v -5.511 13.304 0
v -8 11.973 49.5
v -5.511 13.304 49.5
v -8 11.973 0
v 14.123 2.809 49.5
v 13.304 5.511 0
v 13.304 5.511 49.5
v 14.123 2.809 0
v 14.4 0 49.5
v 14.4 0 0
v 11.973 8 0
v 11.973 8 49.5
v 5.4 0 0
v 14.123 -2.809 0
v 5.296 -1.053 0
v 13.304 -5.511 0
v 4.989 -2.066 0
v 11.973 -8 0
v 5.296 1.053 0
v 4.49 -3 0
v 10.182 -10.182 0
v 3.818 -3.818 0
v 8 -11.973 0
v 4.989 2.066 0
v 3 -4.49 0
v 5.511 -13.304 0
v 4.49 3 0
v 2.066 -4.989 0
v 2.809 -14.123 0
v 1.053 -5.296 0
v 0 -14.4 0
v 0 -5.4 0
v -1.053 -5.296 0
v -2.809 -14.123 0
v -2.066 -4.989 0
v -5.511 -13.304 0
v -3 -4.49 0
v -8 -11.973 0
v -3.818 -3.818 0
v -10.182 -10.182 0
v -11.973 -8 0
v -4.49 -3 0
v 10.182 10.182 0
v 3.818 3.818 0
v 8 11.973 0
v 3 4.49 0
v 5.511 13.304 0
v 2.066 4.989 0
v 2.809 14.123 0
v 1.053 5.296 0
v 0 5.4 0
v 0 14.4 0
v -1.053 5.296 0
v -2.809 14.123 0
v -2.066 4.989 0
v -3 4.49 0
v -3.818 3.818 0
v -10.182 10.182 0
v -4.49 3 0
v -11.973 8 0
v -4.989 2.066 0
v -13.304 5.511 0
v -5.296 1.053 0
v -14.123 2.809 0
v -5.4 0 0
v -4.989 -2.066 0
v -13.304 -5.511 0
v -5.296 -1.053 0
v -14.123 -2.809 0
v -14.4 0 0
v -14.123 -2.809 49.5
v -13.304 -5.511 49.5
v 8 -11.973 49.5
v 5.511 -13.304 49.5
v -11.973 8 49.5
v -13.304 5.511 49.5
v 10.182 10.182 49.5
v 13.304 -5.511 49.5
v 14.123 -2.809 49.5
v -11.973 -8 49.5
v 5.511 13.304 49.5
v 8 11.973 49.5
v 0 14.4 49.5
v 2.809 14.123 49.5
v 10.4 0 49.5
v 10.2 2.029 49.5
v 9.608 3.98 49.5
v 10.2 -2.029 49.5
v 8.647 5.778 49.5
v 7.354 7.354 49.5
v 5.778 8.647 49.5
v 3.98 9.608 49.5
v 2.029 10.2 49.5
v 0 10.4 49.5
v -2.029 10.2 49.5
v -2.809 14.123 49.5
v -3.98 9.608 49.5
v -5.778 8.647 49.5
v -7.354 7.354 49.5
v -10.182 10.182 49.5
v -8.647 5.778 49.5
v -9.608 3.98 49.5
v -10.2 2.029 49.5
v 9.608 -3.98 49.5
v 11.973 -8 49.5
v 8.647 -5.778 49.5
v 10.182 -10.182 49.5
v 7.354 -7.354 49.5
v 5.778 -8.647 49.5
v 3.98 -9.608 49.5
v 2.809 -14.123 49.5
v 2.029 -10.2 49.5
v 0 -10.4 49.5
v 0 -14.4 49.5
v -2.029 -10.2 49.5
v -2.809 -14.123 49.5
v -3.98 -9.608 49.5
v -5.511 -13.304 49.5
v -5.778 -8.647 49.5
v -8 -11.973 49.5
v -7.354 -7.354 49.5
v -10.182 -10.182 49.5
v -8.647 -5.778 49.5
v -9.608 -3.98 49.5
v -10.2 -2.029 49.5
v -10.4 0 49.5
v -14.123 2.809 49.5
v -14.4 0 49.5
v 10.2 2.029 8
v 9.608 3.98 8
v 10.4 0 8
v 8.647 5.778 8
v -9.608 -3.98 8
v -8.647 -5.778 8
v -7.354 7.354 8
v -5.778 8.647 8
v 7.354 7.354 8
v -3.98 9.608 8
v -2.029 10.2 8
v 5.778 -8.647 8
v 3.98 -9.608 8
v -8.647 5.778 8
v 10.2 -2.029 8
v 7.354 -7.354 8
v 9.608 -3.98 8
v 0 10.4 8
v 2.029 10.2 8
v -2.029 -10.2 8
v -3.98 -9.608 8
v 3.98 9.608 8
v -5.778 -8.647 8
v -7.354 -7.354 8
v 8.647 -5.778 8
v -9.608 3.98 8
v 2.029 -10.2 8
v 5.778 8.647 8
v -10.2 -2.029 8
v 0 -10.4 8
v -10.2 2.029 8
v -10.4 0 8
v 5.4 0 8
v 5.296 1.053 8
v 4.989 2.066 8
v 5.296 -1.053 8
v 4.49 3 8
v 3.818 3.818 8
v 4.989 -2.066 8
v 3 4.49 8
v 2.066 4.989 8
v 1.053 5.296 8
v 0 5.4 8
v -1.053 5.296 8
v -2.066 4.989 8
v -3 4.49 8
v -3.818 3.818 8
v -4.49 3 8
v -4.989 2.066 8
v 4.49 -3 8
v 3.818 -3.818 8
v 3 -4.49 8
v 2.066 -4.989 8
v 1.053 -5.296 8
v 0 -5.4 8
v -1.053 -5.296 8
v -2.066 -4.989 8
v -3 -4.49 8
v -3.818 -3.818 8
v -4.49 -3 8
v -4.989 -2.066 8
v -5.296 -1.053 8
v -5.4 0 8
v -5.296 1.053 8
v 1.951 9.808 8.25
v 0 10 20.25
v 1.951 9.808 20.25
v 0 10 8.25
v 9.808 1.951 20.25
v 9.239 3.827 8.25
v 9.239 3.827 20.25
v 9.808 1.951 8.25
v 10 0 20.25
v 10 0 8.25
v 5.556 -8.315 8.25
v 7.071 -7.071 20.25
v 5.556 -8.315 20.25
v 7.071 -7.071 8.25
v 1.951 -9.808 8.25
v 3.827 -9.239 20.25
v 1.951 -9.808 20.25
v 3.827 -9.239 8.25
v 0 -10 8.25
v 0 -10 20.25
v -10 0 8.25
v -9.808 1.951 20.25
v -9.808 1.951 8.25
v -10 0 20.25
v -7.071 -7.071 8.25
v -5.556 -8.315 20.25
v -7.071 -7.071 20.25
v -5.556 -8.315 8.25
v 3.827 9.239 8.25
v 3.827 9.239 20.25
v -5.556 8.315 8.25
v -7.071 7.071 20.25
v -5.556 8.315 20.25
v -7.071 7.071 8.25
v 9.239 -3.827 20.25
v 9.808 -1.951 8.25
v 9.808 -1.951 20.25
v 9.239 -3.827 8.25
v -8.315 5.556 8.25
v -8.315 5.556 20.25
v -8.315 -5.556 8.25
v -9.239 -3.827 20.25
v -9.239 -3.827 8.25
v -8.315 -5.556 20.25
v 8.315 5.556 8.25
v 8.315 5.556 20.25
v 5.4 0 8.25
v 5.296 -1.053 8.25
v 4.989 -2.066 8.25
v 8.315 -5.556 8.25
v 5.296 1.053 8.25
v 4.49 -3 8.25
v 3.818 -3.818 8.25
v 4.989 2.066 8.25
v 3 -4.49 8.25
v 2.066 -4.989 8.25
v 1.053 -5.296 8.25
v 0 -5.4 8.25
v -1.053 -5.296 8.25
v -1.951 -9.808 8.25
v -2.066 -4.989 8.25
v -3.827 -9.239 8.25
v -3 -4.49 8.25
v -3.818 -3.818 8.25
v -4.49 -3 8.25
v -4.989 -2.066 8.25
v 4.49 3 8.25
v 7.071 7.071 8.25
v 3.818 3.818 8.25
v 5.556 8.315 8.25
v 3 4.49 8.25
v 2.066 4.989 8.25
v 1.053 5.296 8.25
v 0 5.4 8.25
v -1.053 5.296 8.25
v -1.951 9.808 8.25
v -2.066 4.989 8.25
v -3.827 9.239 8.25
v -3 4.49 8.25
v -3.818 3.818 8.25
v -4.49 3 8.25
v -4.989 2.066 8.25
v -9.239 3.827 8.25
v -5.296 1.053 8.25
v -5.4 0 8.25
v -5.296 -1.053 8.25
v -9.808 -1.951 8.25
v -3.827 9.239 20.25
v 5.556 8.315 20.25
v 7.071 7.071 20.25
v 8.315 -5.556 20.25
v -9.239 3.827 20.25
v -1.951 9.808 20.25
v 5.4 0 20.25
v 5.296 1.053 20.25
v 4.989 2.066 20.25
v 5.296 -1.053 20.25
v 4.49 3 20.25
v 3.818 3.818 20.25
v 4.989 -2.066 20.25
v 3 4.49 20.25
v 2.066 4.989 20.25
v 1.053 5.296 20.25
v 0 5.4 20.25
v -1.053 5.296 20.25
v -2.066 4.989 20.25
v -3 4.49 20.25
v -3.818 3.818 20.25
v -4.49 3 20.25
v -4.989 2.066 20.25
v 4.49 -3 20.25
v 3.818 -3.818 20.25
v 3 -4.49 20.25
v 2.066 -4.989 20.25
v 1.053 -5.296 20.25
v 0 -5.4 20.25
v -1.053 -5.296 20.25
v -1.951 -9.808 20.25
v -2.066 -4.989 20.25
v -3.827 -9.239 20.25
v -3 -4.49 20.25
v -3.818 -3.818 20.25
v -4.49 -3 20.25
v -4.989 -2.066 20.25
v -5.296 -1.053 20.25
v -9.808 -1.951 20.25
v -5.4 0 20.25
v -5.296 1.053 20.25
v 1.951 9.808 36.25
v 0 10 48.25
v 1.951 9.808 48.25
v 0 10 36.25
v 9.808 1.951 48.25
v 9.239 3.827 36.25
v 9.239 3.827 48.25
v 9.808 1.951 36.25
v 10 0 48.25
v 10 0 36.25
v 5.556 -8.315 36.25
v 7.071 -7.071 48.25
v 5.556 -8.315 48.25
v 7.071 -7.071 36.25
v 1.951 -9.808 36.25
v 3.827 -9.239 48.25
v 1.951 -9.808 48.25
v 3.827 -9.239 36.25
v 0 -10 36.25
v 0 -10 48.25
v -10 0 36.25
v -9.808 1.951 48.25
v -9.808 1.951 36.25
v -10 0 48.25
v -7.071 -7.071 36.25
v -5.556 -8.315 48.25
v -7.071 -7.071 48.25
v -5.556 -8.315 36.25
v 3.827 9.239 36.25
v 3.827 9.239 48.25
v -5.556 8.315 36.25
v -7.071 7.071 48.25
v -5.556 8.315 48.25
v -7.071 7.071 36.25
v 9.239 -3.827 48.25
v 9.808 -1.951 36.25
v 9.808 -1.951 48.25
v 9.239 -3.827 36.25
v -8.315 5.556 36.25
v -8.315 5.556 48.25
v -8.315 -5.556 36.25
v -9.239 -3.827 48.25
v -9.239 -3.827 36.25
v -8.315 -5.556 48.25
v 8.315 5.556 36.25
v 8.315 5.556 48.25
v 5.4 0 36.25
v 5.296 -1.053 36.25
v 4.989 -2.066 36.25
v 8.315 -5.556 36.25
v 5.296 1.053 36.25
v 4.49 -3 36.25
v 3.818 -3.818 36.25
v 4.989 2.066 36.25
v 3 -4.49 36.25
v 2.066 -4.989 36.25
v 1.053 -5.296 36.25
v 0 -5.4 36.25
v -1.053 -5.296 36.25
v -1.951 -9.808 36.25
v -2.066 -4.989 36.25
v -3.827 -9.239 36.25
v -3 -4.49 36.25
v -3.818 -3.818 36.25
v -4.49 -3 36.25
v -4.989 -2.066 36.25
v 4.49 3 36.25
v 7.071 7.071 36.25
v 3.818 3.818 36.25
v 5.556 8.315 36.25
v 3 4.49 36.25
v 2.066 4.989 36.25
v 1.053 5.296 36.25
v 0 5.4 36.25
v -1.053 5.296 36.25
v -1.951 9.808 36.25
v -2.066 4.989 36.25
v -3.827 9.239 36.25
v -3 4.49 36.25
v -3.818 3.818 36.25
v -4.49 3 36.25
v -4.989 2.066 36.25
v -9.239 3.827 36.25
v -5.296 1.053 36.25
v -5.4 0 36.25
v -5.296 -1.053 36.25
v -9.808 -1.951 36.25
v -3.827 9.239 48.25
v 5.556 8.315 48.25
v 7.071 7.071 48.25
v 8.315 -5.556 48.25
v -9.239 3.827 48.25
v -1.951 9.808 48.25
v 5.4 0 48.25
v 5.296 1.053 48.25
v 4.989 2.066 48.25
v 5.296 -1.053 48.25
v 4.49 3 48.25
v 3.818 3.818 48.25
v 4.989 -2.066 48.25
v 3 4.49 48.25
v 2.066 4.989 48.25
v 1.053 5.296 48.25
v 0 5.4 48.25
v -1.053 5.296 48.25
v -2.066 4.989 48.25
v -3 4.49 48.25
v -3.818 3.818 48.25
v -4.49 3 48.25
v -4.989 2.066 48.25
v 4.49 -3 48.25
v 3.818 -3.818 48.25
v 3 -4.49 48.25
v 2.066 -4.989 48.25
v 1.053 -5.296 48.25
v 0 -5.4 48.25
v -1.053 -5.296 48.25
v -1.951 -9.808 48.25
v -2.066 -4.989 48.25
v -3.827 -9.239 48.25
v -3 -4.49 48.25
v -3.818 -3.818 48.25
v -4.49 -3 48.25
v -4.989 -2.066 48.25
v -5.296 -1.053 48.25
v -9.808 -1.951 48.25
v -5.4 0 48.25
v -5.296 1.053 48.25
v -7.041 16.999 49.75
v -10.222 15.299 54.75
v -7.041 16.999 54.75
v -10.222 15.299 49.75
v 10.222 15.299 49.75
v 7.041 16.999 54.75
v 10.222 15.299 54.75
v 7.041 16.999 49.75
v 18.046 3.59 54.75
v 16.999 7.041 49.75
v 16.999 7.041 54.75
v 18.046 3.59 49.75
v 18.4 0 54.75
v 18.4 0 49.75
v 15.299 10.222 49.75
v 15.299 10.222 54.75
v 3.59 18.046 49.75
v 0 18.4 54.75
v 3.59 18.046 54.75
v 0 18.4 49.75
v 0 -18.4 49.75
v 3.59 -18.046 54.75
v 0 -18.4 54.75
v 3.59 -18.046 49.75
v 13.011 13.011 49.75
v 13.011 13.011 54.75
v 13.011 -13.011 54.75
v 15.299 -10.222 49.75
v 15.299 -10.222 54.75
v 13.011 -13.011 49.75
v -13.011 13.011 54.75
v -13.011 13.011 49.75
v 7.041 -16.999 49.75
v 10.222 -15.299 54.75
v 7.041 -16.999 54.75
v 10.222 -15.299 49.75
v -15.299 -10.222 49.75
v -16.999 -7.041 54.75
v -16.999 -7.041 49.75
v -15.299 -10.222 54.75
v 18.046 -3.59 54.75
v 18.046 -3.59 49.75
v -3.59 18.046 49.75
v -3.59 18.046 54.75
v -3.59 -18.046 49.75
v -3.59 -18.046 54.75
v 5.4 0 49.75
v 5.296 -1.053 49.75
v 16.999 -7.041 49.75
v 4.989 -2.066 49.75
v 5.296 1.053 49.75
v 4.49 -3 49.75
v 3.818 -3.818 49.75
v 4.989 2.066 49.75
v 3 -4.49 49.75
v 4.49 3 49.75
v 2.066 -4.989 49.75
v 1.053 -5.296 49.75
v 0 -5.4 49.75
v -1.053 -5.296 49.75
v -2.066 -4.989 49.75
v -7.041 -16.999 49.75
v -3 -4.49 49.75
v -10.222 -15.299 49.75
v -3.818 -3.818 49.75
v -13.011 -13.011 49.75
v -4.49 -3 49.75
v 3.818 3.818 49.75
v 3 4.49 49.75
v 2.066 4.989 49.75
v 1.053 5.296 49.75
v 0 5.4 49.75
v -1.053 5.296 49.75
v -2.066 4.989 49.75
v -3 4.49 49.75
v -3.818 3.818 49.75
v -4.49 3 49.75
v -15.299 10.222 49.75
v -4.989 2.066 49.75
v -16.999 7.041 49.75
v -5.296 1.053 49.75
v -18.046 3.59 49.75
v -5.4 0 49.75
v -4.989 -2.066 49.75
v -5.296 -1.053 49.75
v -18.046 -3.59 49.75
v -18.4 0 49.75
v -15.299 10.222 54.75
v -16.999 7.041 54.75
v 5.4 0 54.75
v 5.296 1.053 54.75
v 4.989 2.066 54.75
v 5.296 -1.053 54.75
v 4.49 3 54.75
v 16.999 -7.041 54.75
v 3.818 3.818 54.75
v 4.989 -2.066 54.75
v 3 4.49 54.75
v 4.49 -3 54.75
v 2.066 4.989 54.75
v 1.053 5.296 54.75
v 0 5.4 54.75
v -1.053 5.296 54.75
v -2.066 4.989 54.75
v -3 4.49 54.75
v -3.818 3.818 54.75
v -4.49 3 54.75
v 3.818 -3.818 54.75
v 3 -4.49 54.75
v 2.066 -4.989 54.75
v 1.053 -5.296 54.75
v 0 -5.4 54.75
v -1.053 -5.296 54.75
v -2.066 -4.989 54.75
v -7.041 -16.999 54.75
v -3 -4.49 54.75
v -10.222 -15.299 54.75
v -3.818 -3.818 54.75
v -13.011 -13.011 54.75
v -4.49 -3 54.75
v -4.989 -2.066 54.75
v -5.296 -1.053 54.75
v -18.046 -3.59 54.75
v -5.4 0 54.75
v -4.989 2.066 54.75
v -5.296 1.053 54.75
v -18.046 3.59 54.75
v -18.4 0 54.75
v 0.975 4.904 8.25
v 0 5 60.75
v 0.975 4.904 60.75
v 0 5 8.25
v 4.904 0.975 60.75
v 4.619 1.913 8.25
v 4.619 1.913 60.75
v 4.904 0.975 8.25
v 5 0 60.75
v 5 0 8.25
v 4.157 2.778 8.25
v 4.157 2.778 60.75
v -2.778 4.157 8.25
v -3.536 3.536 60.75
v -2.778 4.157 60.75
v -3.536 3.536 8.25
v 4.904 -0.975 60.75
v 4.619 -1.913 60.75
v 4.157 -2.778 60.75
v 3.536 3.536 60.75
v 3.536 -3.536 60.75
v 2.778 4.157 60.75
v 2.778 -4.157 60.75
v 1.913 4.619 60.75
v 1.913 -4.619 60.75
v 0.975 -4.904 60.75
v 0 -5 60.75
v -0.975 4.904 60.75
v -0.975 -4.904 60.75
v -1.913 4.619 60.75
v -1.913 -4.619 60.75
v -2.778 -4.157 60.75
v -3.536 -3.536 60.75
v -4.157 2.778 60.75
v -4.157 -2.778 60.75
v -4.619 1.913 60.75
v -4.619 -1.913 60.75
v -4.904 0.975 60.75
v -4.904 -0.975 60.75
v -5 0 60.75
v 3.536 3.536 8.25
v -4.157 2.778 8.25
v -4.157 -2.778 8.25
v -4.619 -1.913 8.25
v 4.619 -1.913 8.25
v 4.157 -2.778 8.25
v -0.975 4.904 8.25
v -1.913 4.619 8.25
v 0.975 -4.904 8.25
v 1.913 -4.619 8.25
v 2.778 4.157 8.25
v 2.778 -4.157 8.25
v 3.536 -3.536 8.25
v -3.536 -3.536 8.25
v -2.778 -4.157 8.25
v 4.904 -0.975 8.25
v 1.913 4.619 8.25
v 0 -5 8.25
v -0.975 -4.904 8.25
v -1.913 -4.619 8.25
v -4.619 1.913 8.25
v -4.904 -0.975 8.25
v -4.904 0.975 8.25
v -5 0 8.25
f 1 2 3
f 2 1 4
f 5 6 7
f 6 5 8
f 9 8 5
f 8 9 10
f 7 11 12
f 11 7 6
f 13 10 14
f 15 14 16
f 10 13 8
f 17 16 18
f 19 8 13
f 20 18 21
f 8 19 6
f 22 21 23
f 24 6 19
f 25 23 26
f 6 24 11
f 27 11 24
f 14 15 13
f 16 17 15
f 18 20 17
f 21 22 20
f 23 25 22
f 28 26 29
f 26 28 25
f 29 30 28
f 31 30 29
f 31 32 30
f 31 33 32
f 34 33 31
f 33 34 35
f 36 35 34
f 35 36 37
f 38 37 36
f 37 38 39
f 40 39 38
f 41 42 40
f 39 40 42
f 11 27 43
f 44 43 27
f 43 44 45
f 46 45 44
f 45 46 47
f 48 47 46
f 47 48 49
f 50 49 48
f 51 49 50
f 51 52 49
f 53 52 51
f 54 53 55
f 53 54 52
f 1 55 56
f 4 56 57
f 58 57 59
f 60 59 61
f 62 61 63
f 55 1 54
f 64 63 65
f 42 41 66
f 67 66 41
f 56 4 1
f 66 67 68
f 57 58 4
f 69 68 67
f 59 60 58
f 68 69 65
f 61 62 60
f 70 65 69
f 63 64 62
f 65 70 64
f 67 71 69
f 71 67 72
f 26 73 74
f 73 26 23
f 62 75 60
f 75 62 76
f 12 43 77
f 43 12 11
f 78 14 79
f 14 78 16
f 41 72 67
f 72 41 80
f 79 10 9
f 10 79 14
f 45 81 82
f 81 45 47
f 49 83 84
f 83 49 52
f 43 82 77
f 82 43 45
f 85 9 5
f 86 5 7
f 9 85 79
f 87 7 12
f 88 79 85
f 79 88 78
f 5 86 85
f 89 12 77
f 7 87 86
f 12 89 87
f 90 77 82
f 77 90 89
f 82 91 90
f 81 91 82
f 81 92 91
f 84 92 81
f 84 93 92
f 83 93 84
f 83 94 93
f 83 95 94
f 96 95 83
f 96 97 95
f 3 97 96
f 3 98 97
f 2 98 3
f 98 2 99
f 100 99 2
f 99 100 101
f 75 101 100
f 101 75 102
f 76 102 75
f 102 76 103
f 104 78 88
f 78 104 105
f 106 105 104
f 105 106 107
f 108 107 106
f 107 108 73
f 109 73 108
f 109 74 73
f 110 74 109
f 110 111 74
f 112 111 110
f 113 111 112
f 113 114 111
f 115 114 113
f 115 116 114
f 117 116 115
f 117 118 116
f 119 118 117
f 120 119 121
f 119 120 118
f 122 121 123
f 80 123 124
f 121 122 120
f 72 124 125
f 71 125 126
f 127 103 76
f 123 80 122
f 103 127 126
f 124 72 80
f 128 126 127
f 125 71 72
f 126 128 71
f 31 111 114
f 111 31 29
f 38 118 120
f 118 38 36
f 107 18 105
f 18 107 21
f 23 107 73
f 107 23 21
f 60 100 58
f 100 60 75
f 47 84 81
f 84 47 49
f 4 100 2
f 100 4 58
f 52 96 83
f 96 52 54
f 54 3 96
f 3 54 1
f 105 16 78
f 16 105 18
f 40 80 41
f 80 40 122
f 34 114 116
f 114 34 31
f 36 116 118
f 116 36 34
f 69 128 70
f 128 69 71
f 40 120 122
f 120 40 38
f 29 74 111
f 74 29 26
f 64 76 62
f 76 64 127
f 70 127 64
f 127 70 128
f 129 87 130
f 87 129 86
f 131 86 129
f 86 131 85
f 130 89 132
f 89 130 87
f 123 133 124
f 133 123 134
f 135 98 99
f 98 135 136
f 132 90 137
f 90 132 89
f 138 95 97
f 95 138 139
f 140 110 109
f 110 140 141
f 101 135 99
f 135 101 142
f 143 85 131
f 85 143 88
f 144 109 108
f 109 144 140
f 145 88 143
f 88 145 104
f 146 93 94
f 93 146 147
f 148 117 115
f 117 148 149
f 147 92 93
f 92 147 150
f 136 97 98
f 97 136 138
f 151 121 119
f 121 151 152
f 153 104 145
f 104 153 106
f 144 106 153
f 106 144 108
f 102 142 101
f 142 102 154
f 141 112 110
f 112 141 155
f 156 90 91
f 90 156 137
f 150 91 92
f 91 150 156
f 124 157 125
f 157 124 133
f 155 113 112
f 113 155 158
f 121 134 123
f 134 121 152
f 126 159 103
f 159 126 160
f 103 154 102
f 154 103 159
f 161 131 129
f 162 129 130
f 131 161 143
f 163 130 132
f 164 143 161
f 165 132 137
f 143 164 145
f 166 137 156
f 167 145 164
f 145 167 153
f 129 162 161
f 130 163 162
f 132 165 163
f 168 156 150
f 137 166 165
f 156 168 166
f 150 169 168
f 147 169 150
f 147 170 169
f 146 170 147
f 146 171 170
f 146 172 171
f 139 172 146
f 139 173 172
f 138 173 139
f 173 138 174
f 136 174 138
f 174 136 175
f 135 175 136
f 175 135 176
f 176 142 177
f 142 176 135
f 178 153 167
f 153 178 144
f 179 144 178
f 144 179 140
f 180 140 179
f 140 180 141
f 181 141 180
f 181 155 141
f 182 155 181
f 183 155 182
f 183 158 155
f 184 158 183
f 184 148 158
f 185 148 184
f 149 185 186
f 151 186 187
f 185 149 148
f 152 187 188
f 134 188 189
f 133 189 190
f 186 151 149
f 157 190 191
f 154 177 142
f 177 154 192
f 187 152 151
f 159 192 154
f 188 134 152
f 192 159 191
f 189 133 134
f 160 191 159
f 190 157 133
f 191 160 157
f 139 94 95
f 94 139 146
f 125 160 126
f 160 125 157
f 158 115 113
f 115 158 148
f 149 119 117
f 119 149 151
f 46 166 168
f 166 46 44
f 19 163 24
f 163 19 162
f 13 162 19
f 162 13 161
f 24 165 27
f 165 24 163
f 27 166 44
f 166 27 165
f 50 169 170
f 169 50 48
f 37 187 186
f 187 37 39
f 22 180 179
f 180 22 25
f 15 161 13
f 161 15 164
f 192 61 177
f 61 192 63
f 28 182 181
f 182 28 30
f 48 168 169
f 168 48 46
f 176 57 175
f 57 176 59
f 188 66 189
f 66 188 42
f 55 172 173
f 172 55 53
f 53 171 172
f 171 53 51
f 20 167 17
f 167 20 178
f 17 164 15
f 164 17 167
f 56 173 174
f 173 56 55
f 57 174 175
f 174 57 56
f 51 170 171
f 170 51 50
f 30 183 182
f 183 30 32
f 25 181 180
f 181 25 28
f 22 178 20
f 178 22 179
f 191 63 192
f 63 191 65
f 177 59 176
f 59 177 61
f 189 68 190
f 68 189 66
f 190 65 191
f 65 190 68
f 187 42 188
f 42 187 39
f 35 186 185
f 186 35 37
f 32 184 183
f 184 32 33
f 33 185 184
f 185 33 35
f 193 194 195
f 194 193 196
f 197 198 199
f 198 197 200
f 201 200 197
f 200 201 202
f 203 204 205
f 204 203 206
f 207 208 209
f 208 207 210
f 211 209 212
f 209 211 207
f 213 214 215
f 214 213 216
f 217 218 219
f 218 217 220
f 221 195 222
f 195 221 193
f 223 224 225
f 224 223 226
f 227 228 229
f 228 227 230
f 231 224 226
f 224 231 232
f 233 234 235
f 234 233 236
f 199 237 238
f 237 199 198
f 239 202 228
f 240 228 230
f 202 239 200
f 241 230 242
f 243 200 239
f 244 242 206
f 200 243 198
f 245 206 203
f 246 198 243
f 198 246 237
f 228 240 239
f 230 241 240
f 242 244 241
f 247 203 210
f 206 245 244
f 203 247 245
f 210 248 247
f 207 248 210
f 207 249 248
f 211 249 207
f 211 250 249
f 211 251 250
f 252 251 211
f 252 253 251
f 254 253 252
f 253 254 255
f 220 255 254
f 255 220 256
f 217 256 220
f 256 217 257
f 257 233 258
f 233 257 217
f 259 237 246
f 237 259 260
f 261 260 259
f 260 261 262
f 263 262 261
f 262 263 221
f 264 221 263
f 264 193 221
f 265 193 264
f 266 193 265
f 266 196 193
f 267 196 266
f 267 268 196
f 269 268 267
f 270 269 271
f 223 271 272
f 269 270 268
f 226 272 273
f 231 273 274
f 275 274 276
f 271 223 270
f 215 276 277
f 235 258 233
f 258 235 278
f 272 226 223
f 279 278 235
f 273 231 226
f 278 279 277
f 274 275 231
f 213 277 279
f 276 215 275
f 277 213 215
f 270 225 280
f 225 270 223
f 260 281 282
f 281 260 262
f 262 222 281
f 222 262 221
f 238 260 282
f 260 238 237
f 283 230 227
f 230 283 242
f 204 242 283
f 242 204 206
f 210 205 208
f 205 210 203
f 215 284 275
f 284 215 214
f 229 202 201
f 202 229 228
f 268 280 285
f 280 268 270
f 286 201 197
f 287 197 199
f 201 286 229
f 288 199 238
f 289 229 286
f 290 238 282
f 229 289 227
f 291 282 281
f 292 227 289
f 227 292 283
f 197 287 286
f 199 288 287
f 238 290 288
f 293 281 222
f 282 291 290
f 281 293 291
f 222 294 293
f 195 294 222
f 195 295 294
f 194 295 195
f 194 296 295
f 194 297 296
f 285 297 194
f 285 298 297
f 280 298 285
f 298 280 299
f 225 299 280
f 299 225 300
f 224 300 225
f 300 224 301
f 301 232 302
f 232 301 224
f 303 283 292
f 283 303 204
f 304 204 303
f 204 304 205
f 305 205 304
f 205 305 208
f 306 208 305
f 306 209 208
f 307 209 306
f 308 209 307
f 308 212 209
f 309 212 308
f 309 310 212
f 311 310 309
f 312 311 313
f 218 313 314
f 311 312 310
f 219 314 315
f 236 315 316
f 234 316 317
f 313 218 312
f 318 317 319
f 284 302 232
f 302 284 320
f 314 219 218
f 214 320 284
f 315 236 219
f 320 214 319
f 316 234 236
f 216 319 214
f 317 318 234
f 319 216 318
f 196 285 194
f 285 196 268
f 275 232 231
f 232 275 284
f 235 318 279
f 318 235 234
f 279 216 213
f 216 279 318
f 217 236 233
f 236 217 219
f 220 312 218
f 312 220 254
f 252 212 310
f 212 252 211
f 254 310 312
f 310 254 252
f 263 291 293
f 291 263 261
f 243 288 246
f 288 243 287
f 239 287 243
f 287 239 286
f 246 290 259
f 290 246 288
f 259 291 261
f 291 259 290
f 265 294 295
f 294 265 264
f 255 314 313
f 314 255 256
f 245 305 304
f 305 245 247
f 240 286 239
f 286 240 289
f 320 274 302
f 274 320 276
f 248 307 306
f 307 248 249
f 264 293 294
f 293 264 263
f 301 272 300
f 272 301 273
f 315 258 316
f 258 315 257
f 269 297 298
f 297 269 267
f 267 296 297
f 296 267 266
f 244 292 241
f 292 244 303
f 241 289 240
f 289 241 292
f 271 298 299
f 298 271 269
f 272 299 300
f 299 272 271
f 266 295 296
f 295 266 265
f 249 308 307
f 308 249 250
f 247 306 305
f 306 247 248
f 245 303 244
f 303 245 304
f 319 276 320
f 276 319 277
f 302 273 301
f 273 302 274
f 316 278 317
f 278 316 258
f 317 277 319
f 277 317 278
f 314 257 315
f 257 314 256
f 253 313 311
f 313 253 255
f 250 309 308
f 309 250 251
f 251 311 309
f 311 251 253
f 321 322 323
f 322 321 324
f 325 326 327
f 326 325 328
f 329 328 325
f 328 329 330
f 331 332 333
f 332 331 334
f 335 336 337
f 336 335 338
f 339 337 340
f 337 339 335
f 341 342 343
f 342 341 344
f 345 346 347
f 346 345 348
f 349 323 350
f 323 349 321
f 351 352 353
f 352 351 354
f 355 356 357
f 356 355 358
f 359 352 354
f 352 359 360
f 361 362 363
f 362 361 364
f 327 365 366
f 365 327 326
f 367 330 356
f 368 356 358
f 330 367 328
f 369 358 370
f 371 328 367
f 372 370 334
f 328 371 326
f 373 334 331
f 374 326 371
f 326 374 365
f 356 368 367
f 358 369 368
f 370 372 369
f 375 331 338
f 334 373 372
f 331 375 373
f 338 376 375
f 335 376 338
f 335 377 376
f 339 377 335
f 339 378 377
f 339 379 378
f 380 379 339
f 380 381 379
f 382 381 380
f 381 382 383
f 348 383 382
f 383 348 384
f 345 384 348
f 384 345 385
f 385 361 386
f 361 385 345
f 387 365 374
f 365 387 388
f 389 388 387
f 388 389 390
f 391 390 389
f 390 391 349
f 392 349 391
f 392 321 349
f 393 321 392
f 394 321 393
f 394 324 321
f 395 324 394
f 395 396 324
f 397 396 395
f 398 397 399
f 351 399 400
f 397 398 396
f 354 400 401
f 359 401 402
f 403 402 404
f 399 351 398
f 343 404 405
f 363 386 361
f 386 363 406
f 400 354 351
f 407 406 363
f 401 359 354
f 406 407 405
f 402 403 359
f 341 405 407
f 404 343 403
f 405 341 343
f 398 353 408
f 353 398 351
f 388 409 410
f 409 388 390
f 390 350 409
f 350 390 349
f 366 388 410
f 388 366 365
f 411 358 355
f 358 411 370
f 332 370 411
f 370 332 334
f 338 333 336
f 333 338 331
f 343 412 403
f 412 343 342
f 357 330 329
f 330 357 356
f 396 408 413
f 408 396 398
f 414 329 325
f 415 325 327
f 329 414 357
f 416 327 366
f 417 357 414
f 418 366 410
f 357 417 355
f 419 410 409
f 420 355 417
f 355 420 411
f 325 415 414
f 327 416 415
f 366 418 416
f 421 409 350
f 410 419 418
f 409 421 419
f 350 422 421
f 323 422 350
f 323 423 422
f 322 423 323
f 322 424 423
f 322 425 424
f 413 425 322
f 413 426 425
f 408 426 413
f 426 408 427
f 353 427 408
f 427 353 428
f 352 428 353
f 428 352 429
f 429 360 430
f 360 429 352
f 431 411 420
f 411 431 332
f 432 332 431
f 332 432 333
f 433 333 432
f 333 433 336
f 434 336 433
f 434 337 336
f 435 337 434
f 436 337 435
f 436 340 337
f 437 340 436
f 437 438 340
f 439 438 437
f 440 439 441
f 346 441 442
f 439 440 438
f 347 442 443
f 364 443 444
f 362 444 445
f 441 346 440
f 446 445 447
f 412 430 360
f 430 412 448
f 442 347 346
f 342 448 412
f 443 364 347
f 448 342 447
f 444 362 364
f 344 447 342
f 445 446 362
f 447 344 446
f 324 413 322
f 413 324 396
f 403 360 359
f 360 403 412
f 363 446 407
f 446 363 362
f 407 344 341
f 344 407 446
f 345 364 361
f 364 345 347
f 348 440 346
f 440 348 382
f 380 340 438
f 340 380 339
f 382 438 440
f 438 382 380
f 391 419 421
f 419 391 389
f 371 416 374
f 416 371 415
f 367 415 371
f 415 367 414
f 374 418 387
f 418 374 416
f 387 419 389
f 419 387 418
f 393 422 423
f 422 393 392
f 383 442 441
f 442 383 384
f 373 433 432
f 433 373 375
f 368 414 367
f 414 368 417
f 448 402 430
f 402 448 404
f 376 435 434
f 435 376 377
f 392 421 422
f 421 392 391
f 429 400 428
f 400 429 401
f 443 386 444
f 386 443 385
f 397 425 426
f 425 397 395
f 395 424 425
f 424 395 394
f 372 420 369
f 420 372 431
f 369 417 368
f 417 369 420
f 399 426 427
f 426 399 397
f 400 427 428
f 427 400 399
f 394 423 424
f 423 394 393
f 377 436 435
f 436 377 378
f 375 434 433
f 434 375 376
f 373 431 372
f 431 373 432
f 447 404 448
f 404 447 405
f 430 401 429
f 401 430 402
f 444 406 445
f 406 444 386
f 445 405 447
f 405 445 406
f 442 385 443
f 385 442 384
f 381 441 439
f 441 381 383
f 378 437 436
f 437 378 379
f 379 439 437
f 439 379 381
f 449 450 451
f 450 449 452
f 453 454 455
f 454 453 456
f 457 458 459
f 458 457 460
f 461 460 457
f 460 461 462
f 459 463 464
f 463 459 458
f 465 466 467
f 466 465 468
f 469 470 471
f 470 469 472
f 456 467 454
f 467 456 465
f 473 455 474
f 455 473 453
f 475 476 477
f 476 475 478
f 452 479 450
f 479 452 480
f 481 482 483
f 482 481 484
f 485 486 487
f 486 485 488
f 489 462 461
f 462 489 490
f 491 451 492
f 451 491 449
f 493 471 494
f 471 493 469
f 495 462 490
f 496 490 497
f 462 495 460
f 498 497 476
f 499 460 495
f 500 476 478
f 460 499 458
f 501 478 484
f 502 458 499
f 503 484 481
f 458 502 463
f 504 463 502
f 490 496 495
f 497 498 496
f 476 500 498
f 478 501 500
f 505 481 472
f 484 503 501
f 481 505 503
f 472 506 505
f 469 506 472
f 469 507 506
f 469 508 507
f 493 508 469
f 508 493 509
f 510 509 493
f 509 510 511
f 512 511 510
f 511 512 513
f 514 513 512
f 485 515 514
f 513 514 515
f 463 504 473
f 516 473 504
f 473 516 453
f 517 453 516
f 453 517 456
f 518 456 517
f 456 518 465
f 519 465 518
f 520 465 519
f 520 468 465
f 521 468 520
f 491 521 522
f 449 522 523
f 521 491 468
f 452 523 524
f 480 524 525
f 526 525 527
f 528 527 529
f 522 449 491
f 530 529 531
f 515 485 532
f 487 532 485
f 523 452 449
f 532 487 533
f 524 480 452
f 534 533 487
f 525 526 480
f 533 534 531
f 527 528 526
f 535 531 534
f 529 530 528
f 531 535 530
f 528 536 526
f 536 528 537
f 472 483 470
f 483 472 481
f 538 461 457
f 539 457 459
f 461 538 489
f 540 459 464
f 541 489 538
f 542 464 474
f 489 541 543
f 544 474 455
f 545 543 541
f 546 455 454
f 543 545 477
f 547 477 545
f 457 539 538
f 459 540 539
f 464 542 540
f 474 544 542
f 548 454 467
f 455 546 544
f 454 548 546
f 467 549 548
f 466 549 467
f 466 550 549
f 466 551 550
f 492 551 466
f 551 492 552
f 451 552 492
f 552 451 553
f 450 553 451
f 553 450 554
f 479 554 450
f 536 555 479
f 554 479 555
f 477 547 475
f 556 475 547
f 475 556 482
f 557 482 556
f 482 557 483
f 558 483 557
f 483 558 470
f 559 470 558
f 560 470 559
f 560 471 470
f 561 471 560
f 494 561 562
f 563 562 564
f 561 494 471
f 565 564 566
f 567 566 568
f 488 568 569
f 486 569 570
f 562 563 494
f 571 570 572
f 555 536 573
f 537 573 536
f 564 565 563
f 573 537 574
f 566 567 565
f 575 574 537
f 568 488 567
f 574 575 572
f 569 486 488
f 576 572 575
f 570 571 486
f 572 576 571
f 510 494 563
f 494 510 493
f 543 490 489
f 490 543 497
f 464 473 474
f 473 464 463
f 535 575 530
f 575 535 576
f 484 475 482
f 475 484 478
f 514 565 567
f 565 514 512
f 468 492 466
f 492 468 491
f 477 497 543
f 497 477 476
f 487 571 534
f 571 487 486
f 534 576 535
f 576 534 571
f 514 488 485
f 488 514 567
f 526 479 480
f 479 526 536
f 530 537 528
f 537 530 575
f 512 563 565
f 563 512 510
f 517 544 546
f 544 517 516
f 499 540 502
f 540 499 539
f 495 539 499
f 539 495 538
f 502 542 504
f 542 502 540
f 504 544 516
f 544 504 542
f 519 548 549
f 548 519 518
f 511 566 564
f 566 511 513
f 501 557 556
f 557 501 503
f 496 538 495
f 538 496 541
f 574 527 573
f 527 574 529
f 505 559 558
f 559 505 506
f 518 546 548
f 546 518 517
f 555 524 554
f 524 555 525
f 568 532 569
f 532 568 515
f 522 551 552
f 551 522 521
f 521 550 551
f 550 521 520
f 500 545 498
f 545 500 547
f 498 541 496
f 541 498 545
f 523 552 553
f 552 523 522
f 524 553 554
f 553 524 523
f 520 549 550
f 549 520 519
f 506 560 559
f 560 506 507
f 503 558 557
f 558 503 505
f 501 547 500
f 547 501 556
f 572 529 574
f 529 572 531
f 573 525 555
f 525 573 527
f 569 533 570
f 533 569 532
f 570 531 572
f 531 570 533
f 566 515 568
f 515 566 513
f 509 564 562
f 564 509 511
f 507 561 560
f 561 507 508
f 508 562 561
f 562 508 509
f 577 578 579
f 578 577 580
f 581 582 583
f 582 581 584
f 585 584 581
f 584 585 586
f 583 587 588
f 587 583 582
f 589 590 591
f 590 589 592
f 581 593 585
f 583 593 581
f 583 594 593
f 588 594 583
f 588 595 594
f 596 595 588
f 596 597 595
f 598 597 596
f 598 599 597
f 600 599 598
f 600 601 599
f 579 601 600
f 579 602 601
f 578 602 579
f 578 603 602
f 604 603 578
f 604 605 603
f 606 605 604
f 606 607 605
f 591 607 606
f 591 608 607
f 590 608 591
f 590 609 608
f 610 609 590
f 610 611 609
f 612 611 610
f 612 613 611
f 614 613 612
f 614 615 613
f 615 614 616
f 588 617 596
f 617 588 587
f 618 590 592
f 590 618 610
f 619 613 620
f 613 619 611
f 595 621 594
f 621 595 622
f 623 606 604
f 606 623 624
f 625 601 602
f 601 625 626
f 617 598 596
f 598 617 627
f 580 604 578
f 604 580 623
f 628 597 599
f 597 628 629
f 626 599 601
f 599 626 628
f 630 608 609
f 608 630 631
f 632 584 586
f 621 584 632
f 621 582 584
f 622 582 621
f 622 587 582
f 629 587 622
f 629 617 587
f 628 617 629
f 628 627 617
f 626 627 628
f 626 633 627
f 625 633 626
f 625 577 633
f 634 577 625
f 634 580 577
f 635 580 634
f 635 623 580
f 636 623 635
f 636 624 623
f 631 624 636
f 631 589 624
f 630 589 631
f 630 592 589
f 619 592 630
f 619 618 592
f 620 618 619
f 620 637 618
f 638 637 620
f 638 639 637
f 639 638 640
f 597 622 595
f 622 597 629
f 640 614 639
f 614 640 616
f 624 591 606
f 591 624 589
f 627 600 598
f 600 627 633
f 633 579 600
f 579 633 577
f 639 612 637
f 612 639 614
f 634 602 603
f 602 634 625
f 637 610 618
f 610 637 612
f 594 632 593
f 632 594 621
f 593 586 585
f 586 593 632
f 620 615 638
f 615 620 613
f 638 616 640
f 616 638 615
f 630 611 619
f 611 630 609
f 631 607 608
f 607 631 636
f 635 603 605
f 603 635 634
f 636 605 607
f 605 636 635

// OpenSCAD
$fn = 32;

// ------------------------------------------------------------------------
// Shaft station: cup d28.8 x 49.5 mm, shaft d10
// Every part is its own module, assembly() places every instance.
// ------------------------------------------------------------------------

// --- part 1 ---
module housing_cup() {
  difference() {
    cylinder(h = 49.5, d = 28.8);
    translate([0, 0, 8]) cylinder(h = 42.5, d = 20.8);
    translate([0, 0, -1]) cylinder(h = 10, d = 10.8);
  }
}

// --- part 2 ---
module bearing_lower() {
  difference() {
      translate([0, 0, 0]) cylinder(h = 12, d = 20);
      translate([0, 0, -1]) cylinder(h = 14, d = 10.8);
    }
}

// --- part 3 ---
module bearing_upper() {
  difference() {
      translate([0, 0, 0]) cylinder(h = 12, d = 20);
      translate([0, 0, -1]) cylinder(h = 14, d = 10.8);
    }
}

// --- part 4 ---
module station_shaft() {
  translate([0, 0, -26.25]) cylinder(h = 52.5, d = 10);
}

// --- part 5 ---
module station_cover() {
  difference() {
    cylinder(h = 5, d = 36.8);
    translate([0, 0, -1]) cylinder(h = 7, d = 10.8);
  }
}

// --- assembly ---
module assembly() {
  color([0.80, 0.24, 0.20]) translate([0, 0, 0]) rotate([0, 0, 0]) housing_cup();
  color([0.20, 0.45, 0.75]) translate([0, 0, 8.25]) rotate([0, 0, 0]) bearing_lower();
  color([0.25, 0.62, 0.32]) translate([0, 0, 36.25]) rotate([0, 0, 0]) bearing_upper();
  color([0.92, 0.70, 0.18]) translate([0, 0, 34.5]) rotate([0, 0, 0]) station_shaft();
  color([0.58, 0.35, 0.70]) translate([0, 0, 49.75]) rotate([0, 0, 0]) station_cover();
}

assembly();
